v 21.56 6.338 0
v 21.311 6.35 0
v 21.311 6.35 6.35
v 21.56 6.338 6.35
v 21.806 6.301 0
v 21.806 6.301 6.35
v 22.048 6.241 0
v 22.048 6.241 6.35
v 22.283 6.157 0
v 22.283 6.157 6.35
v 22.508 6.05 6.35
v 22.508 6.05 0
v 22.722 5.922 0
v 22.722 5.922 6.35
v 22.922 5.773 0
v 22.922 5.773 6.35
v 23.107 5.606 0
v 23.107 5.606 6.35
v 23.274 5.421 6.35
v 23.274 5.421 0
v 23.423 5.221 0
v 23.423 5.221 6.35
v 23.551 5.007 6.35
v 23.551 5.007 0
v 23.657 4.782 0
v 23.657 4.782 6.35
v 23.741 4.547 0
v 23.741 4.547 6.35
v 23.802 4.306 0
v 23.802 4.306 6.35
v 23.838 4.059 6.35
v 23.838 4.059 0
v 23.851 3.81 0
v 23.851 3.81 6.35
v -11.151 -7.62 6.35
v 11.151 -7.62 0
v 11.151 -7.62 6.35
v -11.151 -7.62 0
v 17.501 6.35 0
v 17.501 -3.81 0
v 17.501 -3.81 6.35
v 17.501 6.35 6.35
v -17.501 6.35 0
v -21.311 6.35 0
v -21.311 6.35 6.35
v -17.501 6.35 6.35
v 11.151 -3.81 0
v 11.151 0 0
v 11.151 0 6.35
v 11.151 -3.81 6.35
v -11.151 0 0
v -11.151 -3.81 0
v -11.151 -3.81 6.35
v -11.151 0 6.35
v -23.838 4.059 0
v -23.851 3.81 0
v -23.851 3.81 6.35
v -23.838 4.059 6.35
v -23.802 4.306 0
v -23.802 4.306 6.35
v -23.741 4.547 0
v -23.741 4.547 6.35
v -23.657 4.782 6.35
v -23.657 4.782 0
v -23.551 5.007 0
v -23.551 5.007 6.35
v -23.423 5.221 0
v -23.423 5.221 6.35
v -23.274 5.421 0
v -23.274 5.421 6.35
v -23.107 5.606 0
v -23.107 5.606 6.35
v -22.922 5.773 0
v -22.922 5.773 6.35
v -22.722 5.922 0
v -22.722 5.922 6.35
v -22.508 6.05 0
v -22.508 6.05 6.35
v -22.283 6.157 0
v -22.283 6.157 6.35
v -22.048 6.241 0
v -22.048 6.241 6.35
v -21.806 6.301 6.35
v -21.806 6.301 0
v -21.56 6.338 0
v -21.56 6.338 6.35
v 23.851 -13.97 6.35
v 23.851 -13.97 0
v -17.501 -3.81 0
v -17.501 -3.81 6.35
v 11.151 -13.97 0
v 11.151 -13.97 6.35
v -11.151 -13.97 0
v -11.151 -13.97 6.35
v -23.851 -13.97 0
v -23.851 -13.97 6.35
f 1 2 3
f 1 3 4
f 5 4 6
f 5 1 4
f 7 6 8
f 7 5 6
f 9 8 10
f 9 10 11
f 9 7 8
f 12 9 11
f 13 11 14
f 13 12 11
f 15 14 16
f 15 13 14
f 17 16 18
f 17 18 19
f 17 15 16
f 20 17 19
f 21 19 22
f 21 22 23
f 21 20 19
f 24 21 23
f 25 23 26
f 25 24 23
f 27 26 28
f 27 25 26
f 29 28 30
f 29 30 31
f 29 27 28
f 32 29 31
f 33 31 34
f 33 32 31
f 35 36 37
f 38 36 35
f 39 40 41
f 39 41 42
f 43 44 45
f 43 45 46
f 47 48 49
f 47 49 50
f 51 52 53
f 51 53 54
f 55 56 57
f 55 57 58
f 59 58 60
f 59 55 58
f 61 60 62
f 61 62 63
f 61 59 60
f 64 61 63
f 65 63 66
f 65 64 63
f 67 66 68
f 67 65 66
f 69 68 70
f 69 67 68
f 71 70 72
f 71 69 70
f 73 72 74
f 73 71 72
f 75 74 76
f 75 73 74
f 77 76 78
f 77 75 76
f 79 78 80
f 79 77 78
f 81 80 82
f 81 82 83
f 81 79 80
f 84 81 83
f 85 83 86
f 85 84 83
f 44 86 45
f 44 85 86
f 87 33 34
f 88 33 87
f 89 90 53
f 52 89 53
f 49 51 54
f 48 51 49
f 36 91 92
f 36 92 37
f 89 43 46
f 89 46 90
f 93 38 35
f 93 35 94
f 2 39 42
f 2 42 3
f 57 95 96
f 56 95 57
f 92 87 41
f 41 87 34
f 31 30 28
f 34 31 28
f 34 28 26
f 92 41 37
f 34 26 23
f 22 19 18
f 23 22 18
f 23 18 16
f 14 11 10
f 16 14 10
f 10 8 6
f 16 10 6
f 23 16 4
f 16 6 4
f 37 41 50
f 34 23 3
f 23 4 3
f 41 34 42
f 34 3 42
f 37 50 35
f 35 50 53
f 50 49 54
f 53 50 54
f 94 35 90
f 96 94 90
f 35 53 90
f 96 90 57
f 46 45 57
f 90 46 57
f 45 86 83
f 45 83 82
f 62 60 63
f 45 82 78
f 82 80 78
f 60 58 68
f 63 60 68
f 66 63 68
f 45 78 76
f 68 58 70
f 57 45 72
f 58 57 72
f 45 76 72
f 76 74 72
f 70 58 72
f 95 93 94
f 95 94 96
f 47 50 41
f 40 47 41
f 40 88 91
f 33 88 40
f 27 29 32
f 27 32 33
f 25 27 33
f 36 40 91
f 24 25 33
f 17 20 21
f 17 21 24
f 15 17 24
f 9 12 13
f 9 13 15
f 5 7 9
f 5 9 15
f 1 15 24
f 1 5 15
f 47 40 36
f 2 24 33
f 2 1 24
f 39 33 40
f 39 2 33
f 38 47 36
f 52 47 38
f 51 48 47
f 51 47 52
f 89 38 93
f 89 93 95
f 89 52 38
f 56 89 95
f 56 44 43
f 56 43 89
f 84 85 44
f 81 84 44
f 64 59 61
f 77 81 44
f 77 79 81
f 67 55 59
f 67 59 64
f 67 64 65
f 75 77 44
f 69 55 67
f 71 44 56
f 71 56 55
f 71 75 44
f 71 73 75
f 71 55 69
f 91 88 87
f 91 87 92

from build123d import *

# Parameters (mm, degrees)
BOSS_EXTRUDE1_DEPTH = 6.35


with BuildPart() as part:
    # Sketch1 → Boss-Extrude1 (new body)
    with BuildSketch(Plane.XY):
        with BuildLine():
            Line((-11.1506, 0), (11.1506, 0))
            Line((11.1506, 0), (11.1506, -3.81))
            Line((11.1506, -3.81), (17.5006, -3.81))
            Line((17.5006, -3.81), (17.5006, 0))
            Line((17.5006, 0), (17.5006, 6.35))
            Line((17.5006, 6.35), (21.3106, 6.35))
            ThreePointArc((21.3106, 6.35), (23.106651224, 5.606051224), (23.8506, 3.81))
            Line((23.8506, 3.81), (23.8506, -7.62))
            Line((23.8506, -7.62), (23.8506, -13.97))
            Line((23.8506, -13.97), (11.1506, -13.97))
            Line((11.1506, -13.97), (11.1506, -7.62))
            Line((11.1506, -7.62), (-11.1506, -7.62))
            Line((-11.1506, -7.62), (-11.1506, -13.97))
            Line((-11.1506, -13.97), (-23.8506, -13.97))
            Line((-23.8506, -13.97), (-23.8506, -7.62))
            Line((-23.8506, -7.62), (-23.8506, 3.81))
            ThreePointArc((-23.8506, 3.81), (-23.106651224, 5.606051224), (-21.3106, 6.35))
            Line((-21.3106, 6.35), (-17.5006, 6.35))
            Line((-17.5006, 6.35), (-17.5006, 0))
            Line((-17.5006, 0), (-17.5006, -3.81))
            Line((-17.5006, -3.81), (-11.1506, -3.81))
            Line((-11.1506, -3.81), (-11.1506, 0))
        make_face()
    extrude(amount=BOSS_EXTRUDE1_DEPTH)


solid = part.part
